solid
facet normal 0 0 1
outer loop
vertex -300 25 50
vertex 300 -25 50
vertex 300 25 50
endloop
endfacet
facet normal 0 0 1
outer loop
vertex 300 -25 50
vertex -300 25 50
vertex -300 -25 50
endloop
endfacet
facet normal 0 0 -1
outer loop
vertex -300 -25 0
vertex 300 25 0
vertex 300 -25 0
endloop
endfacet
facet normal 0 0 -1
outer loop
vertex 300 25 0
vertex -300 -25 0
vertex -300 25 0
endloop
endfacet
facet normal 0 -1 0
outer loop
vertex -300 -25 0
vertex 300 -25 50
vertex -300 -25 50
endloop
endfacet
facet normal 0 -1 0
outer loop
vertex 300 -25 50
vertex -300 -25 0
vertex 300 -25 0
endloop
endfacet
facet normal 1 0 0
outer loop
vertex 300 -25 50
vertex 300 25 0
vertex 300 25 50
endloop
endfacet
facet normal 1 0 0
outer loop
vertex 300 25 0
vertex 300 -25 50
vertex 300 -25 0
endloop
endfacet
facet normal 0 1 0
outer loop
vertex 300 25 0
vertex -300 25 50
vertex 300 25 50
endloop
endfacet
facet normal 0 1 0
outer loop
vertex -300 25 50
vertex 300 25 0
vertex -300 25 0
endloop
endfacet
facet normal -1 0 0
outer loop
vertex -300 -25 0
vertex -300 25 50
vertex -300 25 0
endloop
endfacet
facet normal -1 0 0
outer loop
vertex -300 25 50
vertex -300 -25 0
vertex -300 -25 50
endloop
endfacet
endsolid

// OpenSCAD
// Generated documentary F1 envelope proxy.
// Not manufacturing geometry, not dimensionally validated, not SimReady.
proxy_id = "993-ENGINE-CARRIER-TURBO";
$fn = 96;

length_mm = 600;
width_mm = 50;
height_mm = 50;

translate([-length_mm / 2, -width_mm / 2, 0])
    cube([length_mm, width_mm, height_mm], center = false);
